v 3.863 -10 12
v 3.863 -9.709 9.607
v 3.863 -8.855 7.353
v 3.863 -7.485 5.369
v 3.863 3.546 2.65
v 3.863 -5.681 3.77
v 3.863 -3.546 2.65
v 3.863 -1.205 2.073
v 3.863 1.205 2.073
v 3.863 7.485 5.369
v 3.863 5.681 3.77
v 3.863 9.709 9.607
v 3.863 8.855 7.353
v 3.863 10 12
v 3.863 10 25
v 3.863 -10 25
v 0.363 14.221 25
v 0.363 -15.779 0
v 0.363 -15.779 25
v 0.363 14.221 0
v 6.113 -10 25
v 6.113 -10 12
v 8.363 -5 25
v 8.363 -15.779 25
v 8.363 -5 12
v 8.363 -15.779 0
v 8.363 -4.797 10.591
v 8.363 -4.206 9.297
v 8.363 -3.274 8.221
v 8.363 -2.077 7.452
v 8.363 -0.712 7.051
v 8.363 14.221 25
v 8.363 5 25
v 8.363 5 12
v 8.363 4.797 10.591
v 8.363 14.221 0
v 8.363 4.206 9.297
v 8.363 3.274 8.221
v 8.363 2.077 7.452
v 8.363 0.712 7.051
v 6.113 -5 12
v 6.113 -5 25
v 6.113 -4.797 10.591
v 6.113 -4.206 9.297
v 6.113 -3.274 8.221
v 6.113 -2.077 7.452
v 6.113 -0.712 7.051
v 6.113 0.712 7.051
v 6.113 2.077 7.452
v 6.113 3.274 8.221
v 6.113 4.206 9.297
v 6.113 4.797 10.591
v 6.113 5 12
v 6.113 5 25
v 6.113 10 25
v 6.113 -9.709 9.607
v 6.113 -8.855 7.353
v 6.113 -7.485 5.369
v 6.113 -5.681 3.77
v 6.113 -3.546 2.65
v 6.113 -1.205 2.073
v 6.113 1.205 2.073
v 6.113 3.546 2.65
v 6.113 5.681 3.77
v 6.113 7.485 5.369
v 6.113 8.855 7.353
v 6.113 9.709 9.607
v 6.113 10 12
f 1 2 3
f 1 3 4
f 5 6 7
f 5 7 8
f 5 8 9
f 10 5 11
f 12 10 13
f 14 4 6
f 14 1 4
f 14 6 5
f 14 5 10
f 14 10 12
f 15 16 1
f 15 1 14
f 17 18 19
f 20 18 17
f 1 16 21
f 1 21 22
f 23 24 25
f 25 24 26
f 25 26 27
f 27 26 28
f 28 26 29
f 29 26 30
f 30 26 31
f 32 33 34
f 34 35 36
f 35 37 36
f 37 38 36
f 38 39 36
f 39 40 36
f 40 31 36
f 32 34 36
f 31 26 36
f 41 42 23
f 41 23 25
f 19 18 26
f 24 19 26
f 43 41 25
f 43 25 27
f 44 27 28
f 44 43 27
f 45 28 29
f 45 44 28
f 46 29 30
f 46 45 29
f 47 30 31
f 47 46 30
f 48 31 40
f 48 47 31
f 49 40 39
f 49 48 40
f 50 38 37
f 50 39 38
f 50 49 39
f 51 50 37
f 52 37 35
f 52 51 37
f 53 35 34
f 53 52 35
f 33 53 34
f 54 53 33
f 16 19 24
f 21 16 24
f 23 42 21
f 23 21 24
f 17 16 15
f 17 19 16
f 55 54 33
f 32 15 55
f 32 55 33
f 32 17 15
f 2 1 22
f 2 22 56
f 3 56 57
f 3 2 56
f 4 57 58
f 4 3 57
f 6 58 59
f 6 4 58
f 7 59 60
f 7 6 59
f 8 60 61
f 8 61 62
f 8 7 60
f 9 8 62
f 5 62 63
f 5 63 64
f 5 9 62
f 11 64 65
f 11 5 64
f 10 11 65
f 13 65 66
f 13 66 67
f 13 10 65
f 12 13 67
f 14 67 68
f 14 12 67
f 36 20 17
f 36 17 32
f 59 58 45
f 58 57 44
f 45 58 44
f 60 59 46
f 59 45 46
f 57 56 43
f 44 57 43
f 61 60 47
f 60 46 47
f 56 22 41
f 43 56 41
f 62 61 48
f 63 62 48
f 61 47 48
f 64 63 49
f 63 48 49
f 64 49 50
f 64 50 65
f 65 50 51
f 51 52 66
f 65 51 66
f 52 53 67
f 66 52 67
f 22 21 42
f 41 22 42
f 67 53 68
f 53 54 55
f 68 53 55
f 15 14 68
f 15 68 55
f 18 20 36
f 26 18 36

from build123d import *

# Parameters (mm, degrees)
F0_W     = 8
F0_H     = 30
F1_DEPTH = 25
F5_DEPTH = 2.25
F7_DEPTH = 2.251


# Not quite as in the source:
# - a feature of the source that left no trace in its solid (it failed there, or was rolled back) is left out


with BuildPart() as f1:
    # F0 (on Top) → F1 (new body)
    with BuildSketch(Plane.XY):
        with Locations((4.3632484525, -0.778583717)):
            Rectangle(F0_W, F0_H)
    extrude(amount=F1_DEPTH)

    # F4 (on offset) → F5 (cut, through all)
    with BuildSketch(Plane.YZ.offset(3.8632484525)):
        with BuildLine():
            Line((-10, 26.291980999), (-10, 12))
            ThreePointArc((-10, 12), (0, 2), (10, 12))
            Line((10, 12), (10, 26.291980999))
            Line((10, 26.291980999), (-10, 26.291980999))
        make_face()
    extrude(amount=F5_DEPTH, mode=Mode.SUBTRACT)

    # F6 (on offset) → F7 (cut, through all)
    with BuildSketch(Plane.YZ.offset(6.1132484525)):
        with BuildLine():
            Line((-5, 26.8745111924), (-5, 12))
            ThreePointArc((-5, 12), (0, 7), (5, 12))
            Line((5, 12), (5, 26.8745111924))
            Line((5, 26.8745111924), (-5, 26.8745111924))
        make_face()
    extrude(amount=F7_DEPTH, mode=Mode.SUBTRACT)


solid = f1.part
